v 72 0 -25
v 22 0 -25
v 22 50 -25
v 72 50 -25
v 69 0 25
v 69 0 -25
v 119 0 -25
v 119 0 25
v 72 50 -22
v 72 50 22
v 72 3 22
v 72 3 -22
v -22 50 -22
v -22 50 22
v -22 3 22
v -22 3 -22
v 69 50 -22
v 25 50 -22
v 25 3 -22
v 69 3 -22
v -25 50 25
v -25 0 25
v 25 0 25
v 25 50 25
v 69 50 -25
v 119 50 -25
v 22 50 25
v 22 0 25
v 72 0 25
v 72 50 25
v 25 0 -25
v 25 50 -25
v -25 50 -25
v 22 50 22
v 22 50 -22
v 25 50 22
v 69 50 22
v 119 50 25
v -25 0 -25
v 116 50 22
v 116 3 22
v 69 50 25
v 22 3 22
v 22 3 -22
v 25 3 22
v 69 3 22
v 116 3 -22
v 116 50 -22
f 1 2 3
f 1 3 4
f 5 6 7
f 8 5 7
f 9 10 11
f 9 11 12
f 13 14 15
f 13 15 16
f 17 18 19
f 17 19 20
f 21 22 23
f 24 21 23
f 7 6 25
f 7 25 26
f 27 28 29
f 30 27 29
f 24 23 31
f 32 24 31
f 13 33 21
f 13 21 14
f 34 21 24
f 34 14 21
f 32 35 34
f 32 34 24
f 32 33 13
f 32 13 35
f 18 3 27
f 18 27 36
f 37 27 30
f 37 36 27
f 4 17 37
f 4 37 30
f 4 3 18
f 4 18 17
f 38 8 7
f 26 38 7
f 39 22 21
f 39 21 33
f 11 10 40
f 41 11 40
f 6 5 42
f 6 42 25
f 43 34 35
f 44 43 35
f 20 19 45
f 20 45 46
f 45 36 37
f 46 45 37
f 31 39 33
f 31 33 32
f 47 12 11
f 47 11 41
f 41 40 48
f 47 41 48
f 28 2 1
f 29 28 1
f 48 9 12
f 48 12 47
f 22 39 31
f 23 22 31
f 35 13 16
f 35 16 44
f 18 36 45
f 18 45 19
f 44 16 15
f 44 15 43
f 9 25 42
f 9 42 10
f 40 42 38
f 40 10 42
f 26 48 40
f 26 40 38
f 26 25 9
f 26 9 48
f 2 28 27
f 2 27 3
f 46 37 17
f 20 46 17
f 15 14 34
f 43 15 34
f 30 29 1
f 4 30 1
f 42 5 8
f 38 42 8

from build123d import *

# Parameters (mm, degrees)
SKETCH_2_W             = 50
SKETCH_2_H             = 50
EXTRUDE_1_DEPTH        = 50
SHELL_1_T              = -3
PATTERN_LINEAR_1_COUNT = 3
PATTERN_LINEAR_1_PITCH = 47


with BuildPart() as part:
    # 草圖2 → 填料-伸長1 (new body)
    with BuildSketch(Plane(origin=(0, 0, 0), x_dir=(1, 0, 0), z_dir=(0, 1, 0))):
        Rectangle(SKETCH_2_W, SKETCH_2_H)
    extrude(amount=EXTRUDE_1_DEPTH)

    # 薄殼1
    shell_1_openings = [part.faces().sort_by_distance(p)[0] for p in [
        (0, 50, 0),
    ]]
    offset(amount=SHELL_1_T, openings=shell_1_openings, kind=Kind.INTERSECTION)


with BuildPart() as pattern_linear_1_1:
    # 直線複製排列1: pattern copy
    add(part.part.moved(Location(Vector(1, 0, 0) * (1 * PATTERN_LINEAR_1_PITCH))))


with BuildPart() as pattern_linear_1_2:
    # 直線複製排列1: pattern copy
    add(part.part.moved(Location(Vector(1, 0, 0) * (2 * PATTERN_LINEAR_1_PITCH))))


solid = Compound([part.part, pattern_linear_1_1.part, pattern_linear_1_2.part])
